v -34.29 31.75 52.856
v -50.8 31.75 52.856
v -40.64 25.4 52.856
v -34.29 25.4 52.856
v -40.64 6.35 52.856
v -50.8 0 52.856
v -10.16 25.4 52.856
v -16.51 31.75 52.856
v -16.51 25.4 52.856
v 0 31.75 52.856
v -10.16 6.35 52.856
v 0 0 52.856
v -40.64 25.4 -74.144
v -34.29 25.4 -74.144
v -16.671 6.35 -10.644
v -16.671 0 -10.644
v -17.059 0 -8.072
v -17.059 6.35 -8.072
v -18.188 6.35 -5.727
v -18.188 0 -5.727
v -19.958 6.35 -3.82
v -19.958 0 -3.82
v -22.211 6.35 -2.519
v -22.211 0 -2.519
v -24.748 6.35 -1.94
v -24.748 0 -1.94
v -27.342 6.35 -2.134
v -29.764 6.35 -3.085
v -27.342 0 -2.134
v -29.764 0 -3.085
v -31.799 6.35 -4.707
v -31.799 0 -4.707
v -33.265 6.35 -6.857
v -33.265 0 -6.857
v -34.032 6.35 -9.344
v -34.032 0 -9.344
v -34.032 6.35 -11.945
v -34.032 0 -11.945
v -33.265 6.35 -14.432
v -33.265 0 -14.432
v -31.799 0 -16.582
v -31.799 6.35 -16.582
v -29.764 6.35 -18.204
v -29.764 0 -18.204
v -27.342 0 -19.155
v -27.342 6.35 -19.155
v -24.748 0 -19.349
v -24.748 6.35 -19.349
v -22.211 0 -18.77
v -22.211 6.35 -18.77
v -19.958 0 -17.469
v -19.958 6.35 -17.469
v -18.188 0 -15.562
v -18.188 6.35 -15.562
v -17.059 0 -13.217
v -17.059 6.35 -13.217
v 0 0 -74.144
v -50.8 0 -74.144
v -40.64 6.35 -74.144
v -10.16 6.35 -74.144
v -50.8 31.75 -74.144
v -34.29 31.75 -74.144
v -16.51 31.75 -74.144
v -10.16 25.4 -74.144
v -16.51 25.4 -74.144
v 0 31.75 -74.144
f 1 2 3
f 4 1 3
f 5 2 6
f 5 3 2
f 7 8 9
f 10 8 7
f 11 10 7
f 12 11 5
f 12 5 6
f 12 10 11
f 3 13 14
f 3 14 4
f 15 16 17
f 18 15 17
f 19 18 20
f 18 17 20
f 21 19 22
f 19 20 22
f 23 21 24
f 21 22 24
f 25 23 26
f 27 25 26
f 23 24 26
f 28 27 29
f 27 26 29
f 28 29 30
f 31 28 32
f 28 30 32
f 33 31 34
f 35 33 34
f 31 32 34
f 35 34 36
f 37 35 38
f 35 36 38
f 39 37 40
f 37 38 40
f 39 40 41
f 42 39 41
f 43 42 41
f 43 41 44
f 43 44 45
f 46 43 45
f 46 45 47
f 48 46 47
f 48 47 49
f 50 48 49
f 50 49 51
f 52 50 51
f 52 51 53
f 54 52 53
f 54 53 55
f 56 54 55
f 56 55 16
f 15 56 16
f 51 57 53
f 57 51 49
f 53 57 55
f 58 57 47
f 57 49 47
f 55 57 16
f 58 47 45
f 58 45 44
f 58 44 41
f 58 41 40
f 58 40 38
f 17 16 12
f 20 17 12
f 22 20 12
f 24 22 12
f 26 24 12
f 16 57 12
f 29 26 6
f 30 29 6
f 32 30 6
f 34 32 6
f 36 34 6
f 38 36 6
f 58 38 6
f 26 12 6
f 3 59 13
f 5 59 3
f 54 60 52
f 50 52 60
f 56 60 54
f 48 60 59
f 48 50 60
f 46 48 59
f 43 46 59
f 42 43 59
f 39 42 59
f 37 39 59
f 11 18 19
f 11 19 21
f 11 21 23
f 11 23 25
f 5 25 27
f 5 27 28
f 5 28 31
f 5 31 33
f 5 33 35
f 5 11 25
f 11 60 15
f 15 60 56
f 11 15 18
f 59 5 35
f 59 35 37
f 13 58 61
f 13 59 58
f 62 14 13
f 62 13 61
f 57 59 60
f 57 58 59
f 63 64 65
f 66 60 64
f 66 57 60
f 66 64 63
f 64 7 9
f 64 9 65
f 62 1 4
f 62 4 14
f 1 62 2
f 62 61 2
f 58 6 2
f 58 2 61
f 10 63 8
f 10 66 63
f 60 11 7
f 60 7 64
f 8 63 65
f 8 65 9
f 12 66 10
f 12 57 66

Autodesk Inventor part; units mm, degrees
ref_plane "YZ Plane" through (0, 0, 0) normal (1, 0, 0) x (0, 1, 0)
ref_plane "XZ Plane" through (0, 0, 0) normal (0, 1, 0) x (-1, 0, 0)
ref_plane "XY Plane" through (0, 0, 0) normal (0, 0, 1) x (1, 0, 0)
sketch "Sketch1" plane through (0, 0, 0) normal (0, 1, 0) x (-1, 0, 0)
  line L0 (0, 52.8555) -> (50.8, 52.8555)
  line L1 (50.8, 52.8555) -> (50.8, -74.1445)
  line L2 (50.8, -74.1445) -> (0, -74.1445)
  line L3 (0, -74.1445) -> (0, 52.8555)
  point P0 (0, 0)
  dimension "d0" = 50.8
  dimension "d1" = 127
extrude "Extrusion1" add sketch "Sketch1" along normal blind 6.35
sketch "Sketch2" plane through (0, 6.35, 0) normal (0, 1, 0) x (1, 0, 0)
  line L0 (-50.8, -52.8555) -> (0, -52.8555) projected
  line L1 (0, 74.1445) -> (-50.8, 74.1445) projected
  line L2 (0, -52.8555) -> (-10.16, -52.8555)
  line L3 (-10.16, -52.8555) -> (-10.16, 74.1445)
  line L4 (-10.16, 74.1445) -> (0, 74.1445)
  line L5 (0, 74.1445) -> (0, -52.8555)
  line L6 (-50.8, 74.1445) -> (-40.64, 74.1445)
  line L7 (-40.64, 74.1445) -> (-40.64, -52.8555)
  line L8 (-40.64, -52.8555) -> (-50.8, -52.8555)
  line L9 (-50.8, -52.8555) -> (-50.8, 74.1445)
  point P0 (0, 0)
  point P1 (-40.64, -52.8555)
  dimension "d4" = 10.16
  dimension "d5" = 10.16
extrude "Extrusion2" add sketch "Sketch2" along normal blind 25.4 contours L9 L1 L7 L0 | L3 L1 L5 L0
sketch "Sketch3" plane through (-40.64, 6.35, 52.8555) normal (1, 0, 0) x (0, 0, -1)
  line L0 (127, 25.4) -> (0, 25.4) projected
  line L1 (0, 25.4) -> (127, 25.4)
  line L2 (127, 25.4) -> (127, 19.05)
  line L3 (127, 19.05) -> (0, 19.05)
  line L4 (0, 19.05) -> (0, 25.4)
  point P0 (52.8555, -6.35)
  dimension "d8" = 6.35
extrude "Extrusion3" add sketch "Sketch3" along normal blind 6.35
sketch "Sketch4" plane through (-10.16, 6.35, -74.1445) normal (-1, 0, 0) x (0, 0, 1)
  line L0 (0, 25.4) -> (127, 25.4) projected
  line L1 (127, 25.4) -> (127, 19.05) projected
  line L2 (0, 25.4) -> (127, 25.4)
  line L3 (127, 25.4) -> (127, 19.05)
  line L4 (127, 19.05) -> (0, 19.05)
  line L5 (0, 19.05) -> (0, 25.4)
  point P0 (74.1445, -6.35)
extrude "Extrusion4" add sketch "Sketch4" along normal blind 6.35
sketch "Sketch5" plane through (0, 0, 0) normal (0, -1, 0) x (1, 0, 0)
  circle A0 centre (-25.4, -10.6445) radius 8.729
  line L0 (0, 52.8555) -> (0, -74.1445) projected
  line L1 (0, -74.1445) -> (-50.8, -74.1445) projected
  point P0 (0, 0)
  dimension "d13" = 25.4
  dimension "d14" = 63.5
extrude "Extrusion5" cut sketch "Sketch5" against normal up to surface (6.35 mm away)
properties part number "jeep pvc connector"
